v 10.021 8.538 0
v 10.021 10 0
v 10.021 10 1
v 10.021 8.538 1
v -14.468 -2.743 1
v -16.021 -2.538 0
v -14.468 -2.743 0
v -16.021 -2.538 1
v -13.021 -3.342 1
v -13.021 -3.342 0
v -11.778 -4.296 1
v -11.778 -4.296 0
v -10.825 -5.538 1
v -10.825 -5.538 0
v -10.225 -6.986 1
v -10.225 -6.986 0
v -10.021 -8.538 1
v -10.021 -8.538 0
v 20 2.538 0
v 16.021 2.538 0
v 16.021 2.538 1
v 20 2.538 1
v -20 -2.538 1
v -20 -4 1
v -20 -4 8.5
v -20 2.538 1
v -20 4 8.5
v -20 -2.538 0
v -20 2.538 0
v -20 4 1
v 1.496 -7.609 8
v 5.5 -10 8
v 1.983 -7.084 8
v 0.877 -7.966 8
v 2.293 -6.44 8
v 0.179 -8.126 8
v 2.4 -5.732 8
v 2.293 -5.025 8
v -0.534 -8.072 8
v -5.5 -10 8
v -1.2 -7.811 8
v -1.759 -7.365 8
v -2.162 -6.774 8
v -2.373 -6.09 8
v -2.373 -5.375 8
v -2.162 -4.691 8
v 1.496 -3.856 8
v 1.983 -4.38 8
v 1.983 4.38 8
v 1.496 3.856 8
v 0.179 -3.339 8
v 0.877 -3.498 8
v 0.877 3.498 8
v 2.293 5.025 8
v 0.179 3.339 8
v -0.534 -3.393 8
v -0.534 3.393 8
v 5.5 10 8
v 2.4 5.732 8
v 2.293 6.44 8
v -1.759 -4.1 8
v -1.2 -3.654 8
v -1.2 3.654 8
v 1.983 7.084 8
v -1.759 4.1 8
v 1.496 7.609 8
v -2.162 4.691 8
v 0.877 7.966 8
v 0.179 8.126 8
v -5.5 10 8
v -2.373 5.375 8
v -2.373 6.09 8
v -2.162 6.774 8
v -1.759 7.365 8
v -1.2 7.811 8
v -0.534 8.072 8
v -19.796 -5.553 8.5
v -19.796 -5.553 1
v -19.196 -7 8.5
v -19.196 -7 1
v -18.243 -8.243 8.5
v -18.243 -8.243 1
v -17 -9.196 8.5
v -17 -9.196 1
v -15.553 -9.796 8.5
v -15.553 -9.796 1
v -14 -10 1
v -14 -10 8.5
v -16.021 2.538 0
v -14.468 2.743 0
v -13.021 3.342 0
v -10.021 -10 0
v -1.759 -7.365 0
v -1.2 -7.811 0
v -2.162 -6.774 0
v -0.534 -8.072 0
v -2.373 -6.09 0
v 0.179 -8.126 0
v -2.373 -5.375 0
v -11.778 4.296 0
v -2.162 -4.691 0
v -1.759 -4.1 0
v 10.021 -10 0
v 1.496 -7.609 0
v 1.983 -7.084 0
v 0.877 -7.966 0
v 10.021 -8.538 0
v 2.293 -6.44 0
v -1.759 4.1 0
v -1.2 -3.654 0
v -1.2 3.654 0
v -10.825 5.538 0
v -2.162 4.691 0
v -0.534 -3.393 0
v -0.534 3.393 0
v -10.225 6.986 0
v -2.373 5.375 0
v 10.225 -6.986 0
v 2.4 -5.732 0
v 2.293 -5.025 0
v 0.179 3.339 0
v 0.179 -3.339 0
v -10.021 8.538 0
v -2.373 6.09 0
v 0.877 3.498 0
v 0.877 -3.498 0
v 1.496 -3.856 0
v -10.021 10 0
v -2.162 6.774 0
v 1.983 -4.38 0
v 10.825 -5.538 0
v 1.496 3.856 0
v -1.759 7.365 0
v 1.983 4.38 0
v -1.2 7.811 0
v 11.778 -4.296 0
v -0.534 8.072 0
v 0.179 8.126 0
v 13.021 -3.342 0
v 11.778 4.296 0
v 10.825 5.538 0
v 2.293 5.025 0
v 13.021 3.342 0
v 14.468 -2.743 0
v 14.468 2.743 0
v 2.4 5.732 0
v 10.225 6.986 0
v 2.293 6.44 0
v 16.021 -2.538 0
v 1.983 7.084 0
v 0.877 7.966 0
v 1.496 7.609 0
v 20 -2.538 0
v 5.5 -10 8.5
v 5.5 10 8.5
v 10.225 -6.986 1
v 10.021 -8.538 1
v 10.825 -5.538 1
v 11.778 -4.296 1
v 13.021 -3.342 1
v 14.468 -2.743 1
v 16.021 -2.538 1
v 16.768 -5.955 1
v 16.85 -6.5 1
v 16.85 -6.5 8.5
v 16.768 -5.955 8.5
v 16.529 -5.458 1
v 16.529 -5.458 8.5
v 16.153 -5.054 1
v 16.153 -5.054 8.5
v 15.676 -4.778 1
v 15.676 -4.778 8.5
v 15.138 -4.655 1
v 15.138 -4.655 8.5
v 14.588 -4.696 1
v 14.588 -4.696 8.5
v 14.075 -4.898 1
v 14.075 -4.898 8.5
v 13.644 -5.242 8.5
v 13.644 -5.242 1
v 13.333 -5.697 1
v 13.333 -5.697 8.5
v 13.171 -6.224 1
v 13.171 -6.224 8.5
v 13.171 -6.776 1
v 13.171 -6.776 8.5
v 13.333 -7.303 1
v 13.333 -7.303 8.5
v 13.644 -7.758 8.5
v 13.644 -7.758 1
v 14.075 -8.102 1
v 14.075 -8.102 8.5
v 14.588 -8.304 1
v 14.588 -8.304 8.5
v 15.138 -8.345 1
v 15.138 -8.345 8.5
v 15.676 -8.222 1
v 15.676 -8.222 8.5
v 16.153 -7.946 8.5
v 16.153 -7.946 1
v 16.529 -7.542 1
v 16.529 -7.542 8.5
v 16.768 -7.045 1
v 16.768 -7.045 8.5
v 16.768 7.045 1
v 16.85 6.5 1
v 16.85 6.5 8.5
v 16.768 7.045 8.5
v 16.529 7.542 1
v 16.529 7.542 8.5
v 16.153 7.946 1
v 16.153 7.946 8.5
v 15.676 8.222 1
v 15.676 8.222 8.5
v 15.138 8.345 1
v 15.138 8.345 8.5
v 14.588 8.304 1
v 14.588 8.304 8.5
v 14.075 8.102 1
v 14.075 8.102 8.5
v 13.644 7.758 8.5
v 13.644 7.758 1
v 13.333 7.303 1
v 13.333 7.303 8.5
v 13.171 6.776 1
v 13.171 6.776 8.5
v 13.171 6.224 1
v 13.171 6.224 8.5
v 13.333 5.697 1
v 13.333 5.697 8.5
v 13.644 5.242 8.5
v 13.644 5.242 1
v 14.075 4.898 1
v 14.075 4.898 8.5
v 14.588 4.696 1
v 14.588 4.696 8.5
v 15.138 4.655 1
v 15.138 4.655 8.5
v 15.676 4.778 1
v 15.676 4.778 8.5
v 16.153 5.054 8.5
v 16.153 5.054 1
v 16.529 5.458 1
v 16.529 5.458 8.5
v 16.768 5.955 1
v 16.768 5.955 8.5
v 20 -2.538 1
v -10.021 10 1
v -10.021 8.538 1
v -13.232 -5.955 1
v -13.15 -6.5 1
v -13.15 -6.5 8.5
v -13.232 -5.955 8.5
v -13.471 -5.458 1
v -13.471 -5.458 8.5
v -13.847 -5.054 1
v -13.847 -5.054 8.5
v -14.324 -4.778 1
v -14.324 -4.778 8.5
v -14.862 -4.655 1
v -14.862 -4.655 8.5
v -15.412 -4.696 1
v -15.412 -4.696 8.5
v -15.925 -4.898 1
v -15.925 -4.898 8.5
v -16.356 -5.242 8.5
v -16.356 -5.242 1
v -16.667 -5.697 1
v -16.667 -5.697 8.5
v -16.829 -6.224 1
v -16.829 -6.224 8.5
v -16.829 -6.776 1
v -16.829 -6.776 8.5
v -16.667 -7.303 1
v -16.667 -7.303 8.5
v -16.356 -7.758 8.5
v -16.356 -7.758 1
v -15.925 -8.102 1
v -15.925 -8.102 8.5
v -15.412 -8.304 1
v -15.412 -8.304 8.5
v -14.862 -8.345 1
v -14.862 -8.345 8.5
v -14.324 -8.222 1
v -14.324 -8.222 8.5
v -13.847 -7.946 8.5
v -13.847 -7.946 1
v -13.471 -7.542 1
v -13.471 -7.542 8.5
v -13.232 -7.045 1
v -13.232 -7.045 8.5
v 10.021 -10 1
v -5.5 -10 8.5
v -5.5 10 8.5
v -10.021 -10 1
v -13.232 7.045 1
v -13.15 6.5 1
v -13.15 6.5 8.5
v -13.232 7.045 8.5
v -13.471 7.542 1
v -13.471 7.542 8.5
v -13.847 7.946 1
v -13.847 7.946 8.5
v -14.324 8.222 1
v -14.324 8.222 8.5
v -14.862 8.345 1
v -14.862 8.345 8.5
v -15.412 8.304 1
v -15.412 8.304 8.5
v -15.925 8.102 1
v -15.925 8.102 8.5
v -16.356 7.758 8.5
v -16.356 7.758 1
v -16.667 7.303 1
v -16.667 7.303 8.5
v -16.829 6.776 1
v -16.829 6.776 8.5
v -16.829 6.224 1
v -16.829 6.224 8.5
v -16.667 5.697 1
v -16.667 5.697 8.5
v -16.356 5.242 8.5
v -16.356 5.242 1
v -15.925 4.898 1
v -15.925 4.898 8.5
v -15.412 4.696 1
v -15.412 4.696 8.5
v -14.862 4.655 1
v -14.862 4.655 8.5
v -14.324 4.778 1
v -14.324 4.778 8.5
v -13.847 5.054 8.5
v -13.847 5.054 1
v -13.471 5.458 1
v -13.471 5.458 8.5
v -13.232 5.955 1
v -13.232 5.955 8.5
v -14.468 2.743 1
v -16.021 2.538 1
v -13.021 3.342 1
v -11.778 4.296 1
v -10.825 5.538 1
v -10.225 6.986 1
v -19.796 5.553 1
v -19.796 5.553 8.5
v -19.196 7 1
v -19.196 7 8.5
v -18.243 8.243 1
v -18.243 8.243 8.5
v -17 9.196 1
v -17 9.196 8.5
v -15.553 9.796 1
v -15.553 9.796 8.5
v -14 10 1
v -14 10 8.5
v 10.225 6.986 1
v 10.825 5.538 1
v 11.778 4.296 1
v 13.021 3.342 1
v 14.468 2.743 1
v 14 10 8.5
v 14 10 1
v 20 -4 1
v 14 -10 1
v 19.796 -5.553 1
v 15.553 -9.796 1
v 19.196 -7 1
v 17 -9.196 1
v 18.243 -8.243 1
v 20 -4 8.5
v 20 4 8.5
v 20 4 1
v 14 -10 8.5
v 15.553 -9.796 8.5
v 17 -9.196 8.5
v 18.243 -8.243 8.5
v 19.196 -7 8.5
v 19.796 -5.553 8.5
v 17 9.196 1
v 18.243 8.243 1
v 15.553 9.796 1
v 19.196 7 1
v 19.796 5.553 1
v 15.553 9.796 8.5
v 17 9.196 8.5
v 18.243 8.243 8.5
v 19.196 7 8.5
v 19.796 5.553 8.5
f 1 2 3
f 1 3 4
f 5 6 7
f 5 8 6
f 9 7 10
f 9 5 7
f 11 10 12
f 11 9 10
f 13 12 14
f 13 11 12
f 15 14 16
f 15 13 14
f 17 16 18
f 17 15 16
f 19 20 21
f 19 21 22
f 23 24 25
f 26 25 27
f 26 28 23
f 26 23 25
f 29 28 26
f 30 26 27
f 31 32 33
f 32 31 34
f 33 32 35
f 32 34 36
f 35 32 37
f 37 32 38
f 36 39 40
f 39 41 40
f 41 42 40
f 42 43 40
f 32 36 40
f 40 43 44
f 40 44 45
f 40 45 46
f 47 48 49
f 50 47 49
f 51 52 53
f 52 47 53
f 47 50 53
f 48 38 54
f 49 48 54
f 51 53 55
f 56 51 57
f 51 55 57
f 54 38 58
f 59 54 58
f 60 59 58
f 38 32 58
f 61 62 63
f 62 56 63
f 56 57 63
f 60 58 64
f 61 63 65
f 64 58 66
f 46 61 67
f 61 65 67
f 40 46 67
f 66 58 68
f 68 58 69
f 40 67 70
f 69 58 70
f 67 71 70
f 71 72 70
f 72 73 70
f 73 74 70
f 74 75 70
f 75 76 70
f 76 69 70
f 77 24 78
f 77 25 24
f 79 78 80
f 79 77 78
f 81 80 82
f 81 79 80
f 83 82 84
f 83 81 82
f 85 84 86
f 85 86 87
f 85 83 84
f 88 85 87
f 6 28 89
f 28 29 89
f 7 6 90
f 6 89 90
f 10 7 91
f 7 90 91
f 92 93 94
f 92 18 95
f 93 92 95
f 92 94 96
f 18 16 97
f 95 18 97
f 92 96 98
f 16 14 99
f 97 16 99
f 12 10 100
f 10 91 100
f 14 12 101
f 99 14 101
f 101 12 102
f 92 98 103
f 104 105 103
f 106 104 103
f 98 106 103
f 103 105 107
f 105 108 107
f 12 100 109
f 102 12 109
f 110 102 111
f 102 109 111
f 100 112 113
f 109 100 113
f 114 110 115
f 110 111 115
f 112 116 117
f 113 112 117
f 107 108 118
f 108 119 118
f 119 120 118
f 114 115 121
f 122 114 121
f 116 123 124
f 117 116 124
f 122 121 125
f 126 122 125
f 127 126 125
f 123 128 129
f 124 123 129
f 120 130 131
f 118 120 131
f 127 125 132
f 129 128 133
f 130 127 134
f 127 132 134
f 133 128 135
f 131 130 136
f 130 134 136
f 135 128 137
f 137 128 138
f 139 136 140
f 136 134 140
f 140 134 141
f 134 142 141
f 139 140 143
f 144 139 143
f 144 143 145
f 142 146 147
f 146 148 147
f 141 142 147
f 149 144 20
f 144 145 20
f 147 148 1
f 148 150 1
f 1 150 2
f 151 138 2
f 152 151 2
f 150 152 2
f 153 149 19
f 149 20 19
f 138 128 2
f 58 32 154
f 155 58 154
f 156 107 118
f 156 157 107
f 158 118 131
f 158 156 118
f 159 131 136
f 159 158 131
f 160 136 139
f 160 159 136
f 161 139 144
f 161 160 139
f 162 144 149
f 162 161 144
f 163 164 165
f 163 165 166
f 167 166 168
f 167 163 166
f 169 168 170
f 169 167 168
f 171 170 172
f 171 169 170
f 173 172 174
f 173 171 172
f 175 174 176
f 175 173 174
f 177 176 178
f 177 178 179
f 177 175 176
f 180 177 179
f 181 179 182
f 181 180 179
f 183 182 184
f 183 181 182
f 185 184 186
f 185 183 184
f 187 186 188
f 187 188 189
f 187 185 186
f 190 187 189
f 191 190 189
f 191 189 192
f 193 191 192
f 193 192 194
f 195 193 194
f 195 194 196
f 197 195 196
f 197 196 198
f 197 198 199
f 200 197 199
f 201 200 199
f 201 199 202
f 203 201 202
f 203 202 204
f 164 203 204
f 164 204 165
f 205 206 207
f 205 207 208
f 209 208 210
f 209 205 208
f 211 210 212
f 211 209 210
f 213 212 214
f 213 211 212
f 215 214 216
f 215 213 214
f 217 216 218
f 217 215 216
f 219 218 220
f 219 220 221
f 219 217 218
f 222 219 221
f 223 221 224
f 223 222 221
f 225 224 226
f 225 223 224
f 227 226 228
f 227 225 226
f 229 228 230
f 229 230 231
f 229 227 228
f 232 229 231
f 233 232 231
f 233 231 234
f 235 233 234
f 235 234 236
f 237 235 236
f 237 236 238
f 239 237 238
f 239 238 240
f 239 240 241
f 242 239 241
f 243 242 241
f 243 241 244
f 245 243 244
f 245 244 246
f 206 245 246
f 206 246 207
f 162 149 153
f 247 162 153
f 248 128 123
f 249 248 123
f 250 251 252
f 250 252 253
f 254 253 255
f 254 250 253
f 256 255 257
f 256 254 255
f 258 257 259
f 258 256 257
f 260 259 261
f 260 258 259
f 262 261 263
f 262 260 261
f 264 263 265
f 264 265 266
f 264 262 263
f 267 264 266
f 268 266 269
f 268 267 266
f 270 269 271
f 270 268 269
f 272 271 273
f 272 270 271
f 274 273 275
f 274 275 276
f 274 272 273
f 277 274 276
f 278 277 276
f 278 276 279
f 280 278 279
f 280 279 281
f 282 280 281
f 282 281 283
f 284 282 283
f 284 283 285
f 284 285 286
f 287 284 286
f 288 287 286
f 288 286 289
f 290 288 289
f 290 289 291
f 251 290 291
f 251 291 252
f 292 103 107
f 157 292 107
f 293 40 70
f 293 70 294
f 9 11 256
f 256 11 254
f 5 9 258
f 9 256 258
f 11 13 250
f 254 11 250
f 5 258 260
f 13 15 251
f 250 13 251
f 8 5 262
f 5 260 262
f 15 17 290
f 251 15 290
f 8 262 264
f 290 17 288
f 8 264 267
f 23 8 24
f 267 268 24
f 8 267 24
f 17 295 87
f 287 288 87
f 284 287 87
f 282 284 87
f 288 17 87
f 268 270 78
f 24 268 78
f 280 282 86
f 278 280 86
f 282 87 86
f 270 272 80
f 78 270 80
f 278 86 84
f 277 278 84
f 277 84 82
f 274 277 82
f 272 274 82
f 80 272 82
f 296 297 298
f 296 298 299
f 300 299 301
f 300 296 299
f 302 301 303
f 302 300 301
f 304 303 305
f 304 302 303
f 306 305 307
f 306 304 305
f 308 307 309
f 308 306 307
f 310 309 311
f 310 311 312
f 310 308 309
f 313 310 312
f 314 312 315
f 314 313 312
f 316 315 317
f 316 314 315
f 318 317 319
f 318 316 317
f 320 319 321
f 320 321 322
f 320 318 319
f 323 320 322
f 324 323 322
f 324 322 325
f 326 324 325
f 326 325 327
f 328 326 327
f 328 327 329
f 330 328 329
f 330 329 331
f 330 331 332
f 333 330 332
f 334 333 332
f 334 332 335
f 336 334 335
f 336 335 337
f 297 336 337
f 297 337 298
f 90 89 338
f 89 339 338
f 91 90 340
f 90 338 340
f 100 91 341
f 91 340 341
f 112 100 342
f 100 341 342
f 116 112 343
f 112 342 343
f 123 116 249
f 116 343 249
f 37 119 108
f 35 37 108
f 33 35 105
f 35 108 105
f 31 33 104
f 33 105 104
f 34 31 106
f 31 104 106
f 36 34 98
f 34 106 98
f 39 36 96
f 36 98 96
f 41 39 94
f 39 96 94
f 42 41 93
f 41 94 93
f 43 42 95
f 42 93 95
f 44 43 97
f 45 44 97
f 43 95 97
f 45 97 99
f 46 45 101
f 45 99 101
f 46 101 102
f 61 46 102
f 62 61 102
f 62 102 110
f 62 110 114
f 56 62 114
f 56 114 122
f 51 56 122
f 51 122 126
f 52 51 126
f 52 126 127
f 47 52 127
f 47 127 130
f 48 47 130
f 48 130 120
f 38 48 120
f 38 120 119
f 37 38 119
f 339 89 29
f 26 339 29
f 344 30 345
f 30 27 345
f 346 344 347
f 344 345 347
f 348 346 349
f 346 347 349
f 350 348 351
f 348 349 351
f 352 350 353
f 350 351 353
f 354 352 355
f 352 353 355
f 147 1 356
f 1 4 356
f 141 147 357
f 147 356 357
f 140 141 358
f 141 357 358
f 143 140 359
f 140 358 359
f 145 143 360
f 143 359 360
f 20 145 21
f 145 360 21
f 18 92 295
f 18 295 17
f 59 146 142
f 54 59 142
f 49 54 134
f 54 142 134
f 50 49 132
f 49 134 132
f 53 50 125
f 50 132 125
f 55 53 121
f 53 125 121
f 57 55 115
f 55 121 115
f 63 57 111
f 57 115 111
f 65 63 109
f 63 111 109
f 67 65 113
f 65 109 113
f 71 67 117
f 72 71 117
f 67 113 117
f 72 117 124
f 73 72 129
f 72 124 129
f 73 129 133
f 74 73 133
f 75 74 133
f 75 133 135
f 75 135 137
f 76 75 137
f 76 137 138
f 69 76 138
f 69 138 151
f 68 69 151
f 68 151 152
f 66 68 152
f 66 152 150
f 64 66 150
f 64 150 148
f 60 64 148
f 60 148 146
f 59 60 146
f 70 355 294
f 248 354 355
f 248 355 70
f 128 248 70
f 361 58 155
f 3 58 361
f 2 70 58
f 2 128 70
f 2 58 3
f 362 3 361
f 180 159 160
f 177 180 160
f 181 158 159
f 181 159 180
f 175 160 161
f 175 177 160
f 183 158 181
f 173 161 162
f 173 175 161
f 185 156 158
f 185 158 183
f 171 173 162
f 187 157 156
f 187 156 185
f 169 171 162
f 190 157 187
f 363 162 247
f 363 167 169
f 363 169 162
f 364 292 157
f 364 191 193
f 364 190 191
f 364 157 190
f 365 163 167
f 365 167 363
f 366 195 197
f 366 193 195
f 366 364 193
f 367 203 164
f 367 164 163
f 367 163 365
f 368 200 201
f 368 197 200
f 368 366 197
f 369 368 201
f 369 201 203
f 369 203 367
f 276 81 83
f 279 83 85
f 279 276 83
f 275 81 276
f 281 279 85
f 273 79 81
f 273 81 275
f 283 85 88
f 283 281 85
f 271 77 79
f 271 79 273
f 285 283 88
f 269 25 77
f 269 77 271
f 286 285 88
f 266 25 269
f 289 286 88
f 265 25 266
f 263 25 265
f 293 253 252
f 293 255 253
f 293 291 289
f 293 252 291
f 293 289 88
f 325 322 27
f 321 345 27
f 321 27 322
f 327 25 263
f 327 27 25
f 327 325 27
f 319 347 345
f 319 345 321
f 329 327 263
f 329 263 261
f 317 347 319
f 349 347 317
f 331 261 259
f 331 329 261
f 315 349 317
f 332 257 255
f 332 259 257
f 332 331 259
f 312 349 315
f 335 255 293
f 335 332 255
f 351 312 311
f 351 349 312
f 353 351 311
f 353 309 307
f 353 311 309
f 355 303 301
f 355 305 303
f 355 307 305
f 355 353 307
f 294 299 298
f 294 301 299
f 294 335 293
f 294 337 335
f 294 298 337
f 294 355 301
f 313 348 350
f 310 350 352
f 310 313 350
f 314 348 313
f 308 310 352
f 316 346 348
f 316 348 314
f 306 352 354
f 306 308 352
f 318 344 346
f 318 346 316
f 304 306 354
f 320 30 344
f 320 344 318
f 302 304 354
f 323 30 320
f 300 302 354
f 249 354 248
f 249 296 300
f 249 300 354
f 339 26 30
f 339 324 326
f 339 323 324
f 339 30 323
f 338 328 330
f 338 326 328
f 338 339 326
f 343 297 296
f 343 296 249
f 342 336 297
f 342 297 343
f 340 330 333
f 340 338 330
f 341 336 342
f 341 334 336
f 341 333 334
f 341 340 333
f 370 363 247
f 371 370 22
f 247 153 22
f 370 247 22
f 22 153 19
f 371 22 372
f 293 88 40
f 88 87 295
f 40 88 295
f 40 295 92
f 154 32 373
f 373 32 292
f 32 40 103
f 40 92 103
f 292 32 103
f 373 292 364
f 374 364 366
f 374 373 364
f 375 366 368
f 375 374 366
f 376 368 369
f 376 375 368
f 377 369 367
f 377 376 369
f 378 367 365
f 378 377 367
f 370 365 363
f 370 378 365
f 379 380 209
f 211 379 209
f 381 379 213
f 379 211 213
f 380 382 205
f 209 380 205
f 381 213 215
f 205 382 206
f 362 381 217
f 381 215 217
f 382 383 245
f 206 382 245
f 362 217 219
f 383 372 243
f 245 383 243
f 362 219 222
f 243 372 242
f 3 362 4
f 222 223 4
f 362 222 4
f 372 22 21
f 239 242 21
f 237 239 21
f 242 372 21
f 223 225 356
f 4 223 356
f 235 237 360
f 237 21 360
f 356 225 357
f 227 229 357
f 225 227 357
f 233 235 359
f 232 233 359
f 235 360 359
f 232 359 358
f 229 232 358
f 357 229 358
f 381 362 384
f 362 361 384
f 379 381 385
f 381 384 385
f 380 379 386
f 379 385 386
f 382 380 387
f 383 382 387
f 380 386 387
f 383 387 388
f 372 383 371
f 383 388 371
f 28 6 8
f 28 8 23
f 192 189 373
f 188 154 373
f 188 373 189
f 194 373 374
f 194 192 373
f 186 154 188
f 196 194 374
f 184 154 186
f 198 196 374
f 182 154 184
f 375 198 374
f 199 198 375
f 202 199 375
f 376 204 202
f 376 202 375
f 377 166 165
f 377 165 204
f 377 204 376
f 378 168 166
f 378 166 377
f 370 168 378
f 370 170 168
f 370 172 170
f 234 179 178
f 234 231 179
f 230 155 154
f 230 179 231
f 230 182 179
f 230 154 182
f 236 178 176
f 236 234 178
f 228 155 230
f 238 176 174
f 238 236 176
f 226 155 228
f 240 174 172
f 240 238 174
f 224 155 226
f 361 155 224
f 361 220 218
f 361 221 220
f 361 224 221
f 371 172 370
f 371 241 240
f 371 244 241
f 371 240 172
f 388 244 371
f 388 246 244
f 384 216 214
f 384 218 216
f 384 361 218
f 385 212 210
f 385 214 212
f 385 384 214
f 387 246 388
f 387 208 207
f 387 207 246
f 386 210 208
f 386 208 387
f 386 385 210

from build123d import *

# Parameters (mm, degrees)
SKETCH_W        = 40
SKETCH_H        = 20
SKETCH_R        = 1.85
PAD_DEPTH       = 8.5
POCKET001_DEPTH = 1
SKETCH003_R     = 2.4
POCKET_DEPTH    = 8.501
SKETCH004_W     = 11
SKETCH004_H     = 1
POCKET002_DEPTH = 20.001
FILLET_R        = 6


with BuildPart() as part:
    # Sketch → Pad (new body)
    with BuildSketch(Plane.XY):
        Rectangle(SKETCH_W, SKETCH_H)
        with Locations((-15, 6.5)):
            Circle(SKETCH_R, mode=Mode.SUBTRACT)
        with Locations((15, 6.5)):
            Circle(SKETCH_R, mode=Mode.SUBTRACT)
        with Locations((15, -6.5)):
            Circle(SKETCH_R, mode=Mode.SUBTRACT)
        with Locations((-15, -6.5)):
            Circle(SKETCH_R, mode=Mode.SUBTRACT)
    extrude(amount=PAD_DEPTH)

    # Sketch002 → Pocket001 (cut)
    with BuildSketch(Plane(origin=(0, 0, 0), x_dir=(1, 0, 0), z_dir=(0, 0, -1))):
        Polygon((20, 13.717063), (10.020782, 11.721405), (10.020782, 2.538416), (20, 2.538416), align=None)
        Polygon((10.020782, -2.538416), (20, -2.538416), (20, -12.706139), (10.020782, -11.721405), align=None)
    pocket001 = extrude(amount=-POCKET001_DEPTH, mode=Mode.SUBTRACT)

    # Mirrored: Pocket001 across Sketch002 V_Axis
    add(pocket001.mirror(Plane(origin=(0, 0, 0), x_dir=(0, 0, -1), z_dir=(1, 0, 0))), mode=Mode.SUBTRACT)

    # Sketch003 (on DatumPlane) → Pocket (cut, through all)
    with BuildSketch(Plane(origin=(0, 0, 0), x_dir=(1, 0, 0), z_dir=(0, 0, -1))):
        with Locations((0, 5.73236)):
            Circle(SKETCH003_R)
        with Locations((0, -5.73236)):
            Circle(SKETCH003_R)
    extrude(amount=-POCKET_DEPTH, mode=Mode.SUBTRACT)

    # Sketch004 (on DatumPlane) → Pocket002 (cut, through all)
    with BuildSketch(Plane(origin=(0, 10, 0), x_dir=(-1, 0, 0), z_dir=(0, 1, 0))):
        with Locations((0, 8.5)):
            Rectangle(SKETCH004_W, SKETCH004_H)
    extrude(amount=-POCKET002_DEPTH, mode=Mode.SUBTRACT)

    # Fillet
    fillet_edges = [part.edges().sort_by_distance(p)[0] for p in [
        (-10.020782, 2.538416, 0.5),
        (-10.020782, -2.538416, 0.5),
        (10.020782, -2.538416, 0.5),
        (10.020782, 2.538416, 0.5),
        (20, 10, 4.75),
        (20, -10, 4.75),
        (-20, -10, 4.75),
        (-20, 10, 4.75),
    ]]
    fillet(fillet_edges, radius=FILLET_R)


solid = part.part
